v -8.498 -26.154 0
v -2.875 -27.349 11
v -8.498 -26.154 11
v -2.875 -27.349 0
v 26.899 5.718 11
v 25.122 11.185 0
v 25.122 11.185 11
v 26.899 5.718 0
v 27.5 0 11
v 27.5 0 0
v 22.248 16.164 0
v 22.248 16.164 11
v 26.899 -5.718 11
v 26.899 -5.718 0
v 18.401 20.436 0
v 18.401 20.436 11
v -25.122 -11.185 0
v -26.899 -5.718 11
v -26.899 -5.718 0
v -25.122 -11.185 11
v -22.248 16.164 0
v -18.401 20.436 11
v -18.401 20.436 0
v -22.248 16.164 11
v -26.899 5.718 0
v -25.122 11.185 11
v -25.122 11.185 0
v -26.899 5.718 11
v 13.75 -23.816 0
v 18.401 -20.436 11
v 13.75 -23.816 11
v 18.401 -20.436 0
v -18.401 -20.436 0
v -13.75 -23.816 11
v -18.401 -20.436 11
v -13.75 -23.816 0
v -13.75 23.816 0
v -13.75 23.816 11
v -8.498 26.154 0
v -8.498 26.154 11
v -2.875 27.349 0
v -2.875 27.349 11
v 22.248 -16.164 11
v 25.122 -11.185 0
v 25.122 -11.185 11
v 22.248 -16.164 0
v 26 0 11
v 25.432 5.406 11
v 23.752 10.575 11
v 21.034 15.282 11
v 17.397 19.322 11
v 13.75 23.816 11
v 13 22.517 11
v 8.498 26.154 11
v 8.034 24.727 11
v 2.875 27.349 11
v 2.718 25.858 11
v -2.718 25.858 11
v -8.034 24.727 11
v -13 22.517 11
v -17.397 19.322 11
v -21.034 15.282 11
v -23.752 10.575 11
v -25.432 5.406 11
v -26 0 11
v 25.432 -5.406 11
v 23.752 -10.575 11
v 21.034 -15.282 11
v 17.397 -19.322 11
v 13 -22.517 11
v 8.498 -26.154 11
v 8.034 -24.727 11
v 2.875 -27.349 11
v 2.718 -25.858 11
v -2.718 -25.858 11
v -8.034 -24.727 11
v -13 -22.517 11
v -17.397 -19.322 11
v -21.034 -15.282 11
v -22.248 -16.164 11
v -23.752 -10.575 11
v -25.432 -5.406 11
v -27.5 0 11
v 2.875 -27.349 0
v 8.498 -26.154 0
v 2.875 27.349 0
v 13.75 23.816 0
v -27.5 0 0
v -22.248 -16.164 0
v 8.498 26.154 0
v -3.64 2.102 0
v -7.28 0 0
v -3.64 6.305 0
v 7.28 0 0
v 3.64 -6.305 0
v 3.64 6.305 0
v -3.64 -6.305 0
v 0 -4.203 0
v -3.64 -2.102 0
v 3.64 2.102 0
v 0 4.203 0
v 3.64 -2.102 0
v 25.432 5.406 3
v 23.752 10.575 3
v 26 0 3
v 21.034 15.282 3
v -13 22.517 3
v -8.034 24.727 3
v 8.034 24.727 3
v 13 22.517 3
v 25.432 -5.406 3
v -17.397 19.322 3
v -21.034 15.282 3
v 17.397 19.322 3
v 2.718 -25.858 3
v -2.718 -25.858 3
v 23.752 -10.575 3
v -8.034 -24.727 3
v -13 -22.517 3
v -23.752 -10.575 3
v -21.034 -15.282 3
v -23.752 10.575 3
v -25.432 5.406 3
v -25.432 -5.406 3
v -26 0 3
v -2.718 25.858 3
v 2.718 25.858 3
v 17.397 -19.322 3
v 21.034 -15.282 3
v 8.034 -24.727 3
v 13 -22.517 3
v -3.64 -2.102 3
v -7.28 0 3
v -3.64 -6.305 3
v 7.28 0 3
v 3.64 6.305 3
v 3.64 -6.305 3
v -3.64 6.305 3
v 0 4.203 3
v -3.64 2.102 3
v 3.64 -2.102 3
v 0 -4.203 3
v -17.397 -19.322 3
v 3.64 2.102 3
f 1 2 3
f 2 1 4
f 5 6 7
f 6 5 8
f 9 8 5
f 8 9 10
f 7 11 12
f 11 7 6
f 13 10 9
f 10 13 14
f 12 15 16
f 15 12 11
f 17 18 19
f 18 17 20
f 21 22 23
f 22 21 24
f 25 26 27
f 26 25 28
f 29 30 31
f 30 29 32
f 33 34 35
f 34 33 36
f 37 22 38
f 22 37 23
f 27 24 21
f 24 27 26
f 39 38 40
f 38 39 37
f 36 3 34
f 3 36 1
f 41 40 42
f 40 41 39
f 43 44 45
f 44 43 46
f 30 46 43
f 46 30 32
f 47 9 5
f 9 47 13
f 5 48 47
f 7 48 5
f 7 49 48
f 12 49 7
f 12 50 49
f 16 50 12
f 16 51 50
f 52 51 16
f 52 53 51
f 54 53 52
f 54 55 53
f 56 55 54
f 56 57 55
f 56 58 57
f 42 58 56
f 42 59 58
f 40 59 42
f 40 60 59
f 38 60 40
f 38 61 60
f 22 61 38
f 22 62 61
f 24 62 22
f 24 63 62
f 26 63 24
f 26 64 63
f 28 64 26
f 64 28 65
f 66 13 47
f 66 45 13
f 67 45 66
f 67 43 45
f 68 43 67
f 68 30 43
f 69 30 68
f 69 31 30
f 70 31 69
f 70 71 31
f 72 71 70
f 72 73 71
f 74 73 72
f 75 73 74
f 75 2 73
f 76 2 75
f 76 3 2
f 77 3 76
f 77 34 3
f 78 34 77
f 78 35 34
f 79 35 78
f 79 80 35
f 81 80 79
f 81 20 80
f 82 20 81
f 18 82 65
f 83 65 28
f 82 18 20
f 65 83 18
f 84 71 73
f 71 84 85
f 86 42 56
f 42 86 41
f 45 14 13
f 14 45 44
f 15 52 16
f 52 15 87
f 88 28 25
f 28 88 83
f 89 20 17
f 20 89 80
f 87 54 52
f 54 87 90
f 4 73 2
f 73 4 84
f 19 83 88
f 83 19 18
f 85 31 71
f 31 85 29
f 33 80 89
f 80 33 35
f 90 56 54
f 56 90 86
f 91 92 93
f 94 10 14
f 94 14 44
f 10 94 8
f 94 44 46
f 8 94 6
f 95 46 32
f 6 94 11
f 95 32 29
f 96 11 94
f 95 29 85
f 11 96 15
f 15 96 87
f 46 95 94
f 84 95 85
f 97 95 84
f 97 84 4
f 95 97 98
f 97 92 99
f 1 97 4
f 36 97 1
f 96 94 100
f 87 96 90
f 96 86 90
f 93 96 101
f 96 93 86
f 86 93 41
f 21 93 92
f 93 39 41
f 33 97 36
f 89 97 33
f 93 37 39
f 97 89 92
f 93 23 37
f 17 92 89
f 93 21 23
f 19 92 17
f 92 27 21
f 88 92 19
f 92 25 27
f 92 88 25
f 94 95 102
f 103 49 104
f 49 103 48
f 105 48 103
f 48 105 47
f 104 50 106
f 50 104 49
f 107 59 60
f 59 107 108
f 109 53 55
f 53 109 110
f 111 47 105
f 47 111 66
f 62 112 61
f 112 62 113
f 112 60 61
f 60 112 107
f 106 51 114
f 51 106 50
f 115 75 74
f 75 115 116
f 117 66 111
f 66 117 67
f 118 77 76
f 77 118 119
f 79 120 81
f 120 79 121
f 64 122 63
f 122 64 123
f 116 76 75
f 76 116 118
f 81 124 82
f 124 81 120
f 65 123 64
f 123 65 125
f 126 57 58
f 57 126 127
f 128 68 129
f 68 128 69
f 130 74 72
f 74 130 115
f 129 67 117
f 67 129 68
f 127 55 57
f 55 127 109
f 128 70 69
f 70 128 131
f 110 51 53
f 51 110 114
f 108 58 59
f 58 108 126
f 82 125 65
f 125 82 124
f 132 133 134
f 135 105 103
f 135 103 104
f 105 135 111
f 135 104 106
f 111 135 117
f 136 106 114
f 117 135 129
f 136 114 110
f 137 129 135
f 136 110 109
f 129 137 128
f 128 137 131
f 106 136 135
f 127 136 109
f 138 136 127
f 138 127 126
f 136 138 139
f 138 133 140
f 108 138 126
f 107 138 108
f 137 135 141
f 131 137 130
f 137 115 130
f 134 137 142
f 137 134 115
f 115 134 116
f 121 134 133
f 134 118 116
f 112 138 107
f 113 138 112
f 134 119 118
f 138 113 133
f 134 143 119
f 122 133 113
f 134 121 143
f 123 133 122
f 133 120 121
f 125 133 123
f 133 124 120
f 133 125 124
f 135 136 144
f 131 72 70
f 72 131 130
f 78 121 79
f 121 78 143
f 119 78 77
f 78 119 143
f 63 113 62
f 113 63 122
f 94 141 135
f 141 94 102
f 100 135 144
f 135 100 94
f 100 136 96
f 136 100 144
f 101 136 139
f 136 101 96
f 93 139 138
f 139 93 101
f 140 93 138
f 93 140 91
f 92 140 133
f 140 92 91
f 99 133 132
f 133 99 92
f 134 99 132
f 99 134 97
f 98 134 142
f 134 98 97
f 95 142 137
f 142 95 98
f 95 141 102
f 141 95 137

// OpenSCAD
// could be changed
lens_outer_radius=52;
star_size_factor=0.014;
wall_thickness=3;
shaft_leght=8;

//don`t change!
star_scale=lens_outer_radius*star_size_factor;

module flat_star() {
rotate([0, 0, 0])circle(10,$fn=3);
rotate([0, 0, 180])circle(10,$fn=3);
}

difference()
{
    translate([0,0,0])cylinder(wall_thickness+shaft_leght,d=lens_outer_radius+wall_thickness);
    translate([0,0,wall_thickness])cylinder(shaft_leght,d=lens_outer_radius);

    linear_extrude(height=wall_thickness) 
    scale([star_scale,star_scale,star_scale])flat_star();
}
